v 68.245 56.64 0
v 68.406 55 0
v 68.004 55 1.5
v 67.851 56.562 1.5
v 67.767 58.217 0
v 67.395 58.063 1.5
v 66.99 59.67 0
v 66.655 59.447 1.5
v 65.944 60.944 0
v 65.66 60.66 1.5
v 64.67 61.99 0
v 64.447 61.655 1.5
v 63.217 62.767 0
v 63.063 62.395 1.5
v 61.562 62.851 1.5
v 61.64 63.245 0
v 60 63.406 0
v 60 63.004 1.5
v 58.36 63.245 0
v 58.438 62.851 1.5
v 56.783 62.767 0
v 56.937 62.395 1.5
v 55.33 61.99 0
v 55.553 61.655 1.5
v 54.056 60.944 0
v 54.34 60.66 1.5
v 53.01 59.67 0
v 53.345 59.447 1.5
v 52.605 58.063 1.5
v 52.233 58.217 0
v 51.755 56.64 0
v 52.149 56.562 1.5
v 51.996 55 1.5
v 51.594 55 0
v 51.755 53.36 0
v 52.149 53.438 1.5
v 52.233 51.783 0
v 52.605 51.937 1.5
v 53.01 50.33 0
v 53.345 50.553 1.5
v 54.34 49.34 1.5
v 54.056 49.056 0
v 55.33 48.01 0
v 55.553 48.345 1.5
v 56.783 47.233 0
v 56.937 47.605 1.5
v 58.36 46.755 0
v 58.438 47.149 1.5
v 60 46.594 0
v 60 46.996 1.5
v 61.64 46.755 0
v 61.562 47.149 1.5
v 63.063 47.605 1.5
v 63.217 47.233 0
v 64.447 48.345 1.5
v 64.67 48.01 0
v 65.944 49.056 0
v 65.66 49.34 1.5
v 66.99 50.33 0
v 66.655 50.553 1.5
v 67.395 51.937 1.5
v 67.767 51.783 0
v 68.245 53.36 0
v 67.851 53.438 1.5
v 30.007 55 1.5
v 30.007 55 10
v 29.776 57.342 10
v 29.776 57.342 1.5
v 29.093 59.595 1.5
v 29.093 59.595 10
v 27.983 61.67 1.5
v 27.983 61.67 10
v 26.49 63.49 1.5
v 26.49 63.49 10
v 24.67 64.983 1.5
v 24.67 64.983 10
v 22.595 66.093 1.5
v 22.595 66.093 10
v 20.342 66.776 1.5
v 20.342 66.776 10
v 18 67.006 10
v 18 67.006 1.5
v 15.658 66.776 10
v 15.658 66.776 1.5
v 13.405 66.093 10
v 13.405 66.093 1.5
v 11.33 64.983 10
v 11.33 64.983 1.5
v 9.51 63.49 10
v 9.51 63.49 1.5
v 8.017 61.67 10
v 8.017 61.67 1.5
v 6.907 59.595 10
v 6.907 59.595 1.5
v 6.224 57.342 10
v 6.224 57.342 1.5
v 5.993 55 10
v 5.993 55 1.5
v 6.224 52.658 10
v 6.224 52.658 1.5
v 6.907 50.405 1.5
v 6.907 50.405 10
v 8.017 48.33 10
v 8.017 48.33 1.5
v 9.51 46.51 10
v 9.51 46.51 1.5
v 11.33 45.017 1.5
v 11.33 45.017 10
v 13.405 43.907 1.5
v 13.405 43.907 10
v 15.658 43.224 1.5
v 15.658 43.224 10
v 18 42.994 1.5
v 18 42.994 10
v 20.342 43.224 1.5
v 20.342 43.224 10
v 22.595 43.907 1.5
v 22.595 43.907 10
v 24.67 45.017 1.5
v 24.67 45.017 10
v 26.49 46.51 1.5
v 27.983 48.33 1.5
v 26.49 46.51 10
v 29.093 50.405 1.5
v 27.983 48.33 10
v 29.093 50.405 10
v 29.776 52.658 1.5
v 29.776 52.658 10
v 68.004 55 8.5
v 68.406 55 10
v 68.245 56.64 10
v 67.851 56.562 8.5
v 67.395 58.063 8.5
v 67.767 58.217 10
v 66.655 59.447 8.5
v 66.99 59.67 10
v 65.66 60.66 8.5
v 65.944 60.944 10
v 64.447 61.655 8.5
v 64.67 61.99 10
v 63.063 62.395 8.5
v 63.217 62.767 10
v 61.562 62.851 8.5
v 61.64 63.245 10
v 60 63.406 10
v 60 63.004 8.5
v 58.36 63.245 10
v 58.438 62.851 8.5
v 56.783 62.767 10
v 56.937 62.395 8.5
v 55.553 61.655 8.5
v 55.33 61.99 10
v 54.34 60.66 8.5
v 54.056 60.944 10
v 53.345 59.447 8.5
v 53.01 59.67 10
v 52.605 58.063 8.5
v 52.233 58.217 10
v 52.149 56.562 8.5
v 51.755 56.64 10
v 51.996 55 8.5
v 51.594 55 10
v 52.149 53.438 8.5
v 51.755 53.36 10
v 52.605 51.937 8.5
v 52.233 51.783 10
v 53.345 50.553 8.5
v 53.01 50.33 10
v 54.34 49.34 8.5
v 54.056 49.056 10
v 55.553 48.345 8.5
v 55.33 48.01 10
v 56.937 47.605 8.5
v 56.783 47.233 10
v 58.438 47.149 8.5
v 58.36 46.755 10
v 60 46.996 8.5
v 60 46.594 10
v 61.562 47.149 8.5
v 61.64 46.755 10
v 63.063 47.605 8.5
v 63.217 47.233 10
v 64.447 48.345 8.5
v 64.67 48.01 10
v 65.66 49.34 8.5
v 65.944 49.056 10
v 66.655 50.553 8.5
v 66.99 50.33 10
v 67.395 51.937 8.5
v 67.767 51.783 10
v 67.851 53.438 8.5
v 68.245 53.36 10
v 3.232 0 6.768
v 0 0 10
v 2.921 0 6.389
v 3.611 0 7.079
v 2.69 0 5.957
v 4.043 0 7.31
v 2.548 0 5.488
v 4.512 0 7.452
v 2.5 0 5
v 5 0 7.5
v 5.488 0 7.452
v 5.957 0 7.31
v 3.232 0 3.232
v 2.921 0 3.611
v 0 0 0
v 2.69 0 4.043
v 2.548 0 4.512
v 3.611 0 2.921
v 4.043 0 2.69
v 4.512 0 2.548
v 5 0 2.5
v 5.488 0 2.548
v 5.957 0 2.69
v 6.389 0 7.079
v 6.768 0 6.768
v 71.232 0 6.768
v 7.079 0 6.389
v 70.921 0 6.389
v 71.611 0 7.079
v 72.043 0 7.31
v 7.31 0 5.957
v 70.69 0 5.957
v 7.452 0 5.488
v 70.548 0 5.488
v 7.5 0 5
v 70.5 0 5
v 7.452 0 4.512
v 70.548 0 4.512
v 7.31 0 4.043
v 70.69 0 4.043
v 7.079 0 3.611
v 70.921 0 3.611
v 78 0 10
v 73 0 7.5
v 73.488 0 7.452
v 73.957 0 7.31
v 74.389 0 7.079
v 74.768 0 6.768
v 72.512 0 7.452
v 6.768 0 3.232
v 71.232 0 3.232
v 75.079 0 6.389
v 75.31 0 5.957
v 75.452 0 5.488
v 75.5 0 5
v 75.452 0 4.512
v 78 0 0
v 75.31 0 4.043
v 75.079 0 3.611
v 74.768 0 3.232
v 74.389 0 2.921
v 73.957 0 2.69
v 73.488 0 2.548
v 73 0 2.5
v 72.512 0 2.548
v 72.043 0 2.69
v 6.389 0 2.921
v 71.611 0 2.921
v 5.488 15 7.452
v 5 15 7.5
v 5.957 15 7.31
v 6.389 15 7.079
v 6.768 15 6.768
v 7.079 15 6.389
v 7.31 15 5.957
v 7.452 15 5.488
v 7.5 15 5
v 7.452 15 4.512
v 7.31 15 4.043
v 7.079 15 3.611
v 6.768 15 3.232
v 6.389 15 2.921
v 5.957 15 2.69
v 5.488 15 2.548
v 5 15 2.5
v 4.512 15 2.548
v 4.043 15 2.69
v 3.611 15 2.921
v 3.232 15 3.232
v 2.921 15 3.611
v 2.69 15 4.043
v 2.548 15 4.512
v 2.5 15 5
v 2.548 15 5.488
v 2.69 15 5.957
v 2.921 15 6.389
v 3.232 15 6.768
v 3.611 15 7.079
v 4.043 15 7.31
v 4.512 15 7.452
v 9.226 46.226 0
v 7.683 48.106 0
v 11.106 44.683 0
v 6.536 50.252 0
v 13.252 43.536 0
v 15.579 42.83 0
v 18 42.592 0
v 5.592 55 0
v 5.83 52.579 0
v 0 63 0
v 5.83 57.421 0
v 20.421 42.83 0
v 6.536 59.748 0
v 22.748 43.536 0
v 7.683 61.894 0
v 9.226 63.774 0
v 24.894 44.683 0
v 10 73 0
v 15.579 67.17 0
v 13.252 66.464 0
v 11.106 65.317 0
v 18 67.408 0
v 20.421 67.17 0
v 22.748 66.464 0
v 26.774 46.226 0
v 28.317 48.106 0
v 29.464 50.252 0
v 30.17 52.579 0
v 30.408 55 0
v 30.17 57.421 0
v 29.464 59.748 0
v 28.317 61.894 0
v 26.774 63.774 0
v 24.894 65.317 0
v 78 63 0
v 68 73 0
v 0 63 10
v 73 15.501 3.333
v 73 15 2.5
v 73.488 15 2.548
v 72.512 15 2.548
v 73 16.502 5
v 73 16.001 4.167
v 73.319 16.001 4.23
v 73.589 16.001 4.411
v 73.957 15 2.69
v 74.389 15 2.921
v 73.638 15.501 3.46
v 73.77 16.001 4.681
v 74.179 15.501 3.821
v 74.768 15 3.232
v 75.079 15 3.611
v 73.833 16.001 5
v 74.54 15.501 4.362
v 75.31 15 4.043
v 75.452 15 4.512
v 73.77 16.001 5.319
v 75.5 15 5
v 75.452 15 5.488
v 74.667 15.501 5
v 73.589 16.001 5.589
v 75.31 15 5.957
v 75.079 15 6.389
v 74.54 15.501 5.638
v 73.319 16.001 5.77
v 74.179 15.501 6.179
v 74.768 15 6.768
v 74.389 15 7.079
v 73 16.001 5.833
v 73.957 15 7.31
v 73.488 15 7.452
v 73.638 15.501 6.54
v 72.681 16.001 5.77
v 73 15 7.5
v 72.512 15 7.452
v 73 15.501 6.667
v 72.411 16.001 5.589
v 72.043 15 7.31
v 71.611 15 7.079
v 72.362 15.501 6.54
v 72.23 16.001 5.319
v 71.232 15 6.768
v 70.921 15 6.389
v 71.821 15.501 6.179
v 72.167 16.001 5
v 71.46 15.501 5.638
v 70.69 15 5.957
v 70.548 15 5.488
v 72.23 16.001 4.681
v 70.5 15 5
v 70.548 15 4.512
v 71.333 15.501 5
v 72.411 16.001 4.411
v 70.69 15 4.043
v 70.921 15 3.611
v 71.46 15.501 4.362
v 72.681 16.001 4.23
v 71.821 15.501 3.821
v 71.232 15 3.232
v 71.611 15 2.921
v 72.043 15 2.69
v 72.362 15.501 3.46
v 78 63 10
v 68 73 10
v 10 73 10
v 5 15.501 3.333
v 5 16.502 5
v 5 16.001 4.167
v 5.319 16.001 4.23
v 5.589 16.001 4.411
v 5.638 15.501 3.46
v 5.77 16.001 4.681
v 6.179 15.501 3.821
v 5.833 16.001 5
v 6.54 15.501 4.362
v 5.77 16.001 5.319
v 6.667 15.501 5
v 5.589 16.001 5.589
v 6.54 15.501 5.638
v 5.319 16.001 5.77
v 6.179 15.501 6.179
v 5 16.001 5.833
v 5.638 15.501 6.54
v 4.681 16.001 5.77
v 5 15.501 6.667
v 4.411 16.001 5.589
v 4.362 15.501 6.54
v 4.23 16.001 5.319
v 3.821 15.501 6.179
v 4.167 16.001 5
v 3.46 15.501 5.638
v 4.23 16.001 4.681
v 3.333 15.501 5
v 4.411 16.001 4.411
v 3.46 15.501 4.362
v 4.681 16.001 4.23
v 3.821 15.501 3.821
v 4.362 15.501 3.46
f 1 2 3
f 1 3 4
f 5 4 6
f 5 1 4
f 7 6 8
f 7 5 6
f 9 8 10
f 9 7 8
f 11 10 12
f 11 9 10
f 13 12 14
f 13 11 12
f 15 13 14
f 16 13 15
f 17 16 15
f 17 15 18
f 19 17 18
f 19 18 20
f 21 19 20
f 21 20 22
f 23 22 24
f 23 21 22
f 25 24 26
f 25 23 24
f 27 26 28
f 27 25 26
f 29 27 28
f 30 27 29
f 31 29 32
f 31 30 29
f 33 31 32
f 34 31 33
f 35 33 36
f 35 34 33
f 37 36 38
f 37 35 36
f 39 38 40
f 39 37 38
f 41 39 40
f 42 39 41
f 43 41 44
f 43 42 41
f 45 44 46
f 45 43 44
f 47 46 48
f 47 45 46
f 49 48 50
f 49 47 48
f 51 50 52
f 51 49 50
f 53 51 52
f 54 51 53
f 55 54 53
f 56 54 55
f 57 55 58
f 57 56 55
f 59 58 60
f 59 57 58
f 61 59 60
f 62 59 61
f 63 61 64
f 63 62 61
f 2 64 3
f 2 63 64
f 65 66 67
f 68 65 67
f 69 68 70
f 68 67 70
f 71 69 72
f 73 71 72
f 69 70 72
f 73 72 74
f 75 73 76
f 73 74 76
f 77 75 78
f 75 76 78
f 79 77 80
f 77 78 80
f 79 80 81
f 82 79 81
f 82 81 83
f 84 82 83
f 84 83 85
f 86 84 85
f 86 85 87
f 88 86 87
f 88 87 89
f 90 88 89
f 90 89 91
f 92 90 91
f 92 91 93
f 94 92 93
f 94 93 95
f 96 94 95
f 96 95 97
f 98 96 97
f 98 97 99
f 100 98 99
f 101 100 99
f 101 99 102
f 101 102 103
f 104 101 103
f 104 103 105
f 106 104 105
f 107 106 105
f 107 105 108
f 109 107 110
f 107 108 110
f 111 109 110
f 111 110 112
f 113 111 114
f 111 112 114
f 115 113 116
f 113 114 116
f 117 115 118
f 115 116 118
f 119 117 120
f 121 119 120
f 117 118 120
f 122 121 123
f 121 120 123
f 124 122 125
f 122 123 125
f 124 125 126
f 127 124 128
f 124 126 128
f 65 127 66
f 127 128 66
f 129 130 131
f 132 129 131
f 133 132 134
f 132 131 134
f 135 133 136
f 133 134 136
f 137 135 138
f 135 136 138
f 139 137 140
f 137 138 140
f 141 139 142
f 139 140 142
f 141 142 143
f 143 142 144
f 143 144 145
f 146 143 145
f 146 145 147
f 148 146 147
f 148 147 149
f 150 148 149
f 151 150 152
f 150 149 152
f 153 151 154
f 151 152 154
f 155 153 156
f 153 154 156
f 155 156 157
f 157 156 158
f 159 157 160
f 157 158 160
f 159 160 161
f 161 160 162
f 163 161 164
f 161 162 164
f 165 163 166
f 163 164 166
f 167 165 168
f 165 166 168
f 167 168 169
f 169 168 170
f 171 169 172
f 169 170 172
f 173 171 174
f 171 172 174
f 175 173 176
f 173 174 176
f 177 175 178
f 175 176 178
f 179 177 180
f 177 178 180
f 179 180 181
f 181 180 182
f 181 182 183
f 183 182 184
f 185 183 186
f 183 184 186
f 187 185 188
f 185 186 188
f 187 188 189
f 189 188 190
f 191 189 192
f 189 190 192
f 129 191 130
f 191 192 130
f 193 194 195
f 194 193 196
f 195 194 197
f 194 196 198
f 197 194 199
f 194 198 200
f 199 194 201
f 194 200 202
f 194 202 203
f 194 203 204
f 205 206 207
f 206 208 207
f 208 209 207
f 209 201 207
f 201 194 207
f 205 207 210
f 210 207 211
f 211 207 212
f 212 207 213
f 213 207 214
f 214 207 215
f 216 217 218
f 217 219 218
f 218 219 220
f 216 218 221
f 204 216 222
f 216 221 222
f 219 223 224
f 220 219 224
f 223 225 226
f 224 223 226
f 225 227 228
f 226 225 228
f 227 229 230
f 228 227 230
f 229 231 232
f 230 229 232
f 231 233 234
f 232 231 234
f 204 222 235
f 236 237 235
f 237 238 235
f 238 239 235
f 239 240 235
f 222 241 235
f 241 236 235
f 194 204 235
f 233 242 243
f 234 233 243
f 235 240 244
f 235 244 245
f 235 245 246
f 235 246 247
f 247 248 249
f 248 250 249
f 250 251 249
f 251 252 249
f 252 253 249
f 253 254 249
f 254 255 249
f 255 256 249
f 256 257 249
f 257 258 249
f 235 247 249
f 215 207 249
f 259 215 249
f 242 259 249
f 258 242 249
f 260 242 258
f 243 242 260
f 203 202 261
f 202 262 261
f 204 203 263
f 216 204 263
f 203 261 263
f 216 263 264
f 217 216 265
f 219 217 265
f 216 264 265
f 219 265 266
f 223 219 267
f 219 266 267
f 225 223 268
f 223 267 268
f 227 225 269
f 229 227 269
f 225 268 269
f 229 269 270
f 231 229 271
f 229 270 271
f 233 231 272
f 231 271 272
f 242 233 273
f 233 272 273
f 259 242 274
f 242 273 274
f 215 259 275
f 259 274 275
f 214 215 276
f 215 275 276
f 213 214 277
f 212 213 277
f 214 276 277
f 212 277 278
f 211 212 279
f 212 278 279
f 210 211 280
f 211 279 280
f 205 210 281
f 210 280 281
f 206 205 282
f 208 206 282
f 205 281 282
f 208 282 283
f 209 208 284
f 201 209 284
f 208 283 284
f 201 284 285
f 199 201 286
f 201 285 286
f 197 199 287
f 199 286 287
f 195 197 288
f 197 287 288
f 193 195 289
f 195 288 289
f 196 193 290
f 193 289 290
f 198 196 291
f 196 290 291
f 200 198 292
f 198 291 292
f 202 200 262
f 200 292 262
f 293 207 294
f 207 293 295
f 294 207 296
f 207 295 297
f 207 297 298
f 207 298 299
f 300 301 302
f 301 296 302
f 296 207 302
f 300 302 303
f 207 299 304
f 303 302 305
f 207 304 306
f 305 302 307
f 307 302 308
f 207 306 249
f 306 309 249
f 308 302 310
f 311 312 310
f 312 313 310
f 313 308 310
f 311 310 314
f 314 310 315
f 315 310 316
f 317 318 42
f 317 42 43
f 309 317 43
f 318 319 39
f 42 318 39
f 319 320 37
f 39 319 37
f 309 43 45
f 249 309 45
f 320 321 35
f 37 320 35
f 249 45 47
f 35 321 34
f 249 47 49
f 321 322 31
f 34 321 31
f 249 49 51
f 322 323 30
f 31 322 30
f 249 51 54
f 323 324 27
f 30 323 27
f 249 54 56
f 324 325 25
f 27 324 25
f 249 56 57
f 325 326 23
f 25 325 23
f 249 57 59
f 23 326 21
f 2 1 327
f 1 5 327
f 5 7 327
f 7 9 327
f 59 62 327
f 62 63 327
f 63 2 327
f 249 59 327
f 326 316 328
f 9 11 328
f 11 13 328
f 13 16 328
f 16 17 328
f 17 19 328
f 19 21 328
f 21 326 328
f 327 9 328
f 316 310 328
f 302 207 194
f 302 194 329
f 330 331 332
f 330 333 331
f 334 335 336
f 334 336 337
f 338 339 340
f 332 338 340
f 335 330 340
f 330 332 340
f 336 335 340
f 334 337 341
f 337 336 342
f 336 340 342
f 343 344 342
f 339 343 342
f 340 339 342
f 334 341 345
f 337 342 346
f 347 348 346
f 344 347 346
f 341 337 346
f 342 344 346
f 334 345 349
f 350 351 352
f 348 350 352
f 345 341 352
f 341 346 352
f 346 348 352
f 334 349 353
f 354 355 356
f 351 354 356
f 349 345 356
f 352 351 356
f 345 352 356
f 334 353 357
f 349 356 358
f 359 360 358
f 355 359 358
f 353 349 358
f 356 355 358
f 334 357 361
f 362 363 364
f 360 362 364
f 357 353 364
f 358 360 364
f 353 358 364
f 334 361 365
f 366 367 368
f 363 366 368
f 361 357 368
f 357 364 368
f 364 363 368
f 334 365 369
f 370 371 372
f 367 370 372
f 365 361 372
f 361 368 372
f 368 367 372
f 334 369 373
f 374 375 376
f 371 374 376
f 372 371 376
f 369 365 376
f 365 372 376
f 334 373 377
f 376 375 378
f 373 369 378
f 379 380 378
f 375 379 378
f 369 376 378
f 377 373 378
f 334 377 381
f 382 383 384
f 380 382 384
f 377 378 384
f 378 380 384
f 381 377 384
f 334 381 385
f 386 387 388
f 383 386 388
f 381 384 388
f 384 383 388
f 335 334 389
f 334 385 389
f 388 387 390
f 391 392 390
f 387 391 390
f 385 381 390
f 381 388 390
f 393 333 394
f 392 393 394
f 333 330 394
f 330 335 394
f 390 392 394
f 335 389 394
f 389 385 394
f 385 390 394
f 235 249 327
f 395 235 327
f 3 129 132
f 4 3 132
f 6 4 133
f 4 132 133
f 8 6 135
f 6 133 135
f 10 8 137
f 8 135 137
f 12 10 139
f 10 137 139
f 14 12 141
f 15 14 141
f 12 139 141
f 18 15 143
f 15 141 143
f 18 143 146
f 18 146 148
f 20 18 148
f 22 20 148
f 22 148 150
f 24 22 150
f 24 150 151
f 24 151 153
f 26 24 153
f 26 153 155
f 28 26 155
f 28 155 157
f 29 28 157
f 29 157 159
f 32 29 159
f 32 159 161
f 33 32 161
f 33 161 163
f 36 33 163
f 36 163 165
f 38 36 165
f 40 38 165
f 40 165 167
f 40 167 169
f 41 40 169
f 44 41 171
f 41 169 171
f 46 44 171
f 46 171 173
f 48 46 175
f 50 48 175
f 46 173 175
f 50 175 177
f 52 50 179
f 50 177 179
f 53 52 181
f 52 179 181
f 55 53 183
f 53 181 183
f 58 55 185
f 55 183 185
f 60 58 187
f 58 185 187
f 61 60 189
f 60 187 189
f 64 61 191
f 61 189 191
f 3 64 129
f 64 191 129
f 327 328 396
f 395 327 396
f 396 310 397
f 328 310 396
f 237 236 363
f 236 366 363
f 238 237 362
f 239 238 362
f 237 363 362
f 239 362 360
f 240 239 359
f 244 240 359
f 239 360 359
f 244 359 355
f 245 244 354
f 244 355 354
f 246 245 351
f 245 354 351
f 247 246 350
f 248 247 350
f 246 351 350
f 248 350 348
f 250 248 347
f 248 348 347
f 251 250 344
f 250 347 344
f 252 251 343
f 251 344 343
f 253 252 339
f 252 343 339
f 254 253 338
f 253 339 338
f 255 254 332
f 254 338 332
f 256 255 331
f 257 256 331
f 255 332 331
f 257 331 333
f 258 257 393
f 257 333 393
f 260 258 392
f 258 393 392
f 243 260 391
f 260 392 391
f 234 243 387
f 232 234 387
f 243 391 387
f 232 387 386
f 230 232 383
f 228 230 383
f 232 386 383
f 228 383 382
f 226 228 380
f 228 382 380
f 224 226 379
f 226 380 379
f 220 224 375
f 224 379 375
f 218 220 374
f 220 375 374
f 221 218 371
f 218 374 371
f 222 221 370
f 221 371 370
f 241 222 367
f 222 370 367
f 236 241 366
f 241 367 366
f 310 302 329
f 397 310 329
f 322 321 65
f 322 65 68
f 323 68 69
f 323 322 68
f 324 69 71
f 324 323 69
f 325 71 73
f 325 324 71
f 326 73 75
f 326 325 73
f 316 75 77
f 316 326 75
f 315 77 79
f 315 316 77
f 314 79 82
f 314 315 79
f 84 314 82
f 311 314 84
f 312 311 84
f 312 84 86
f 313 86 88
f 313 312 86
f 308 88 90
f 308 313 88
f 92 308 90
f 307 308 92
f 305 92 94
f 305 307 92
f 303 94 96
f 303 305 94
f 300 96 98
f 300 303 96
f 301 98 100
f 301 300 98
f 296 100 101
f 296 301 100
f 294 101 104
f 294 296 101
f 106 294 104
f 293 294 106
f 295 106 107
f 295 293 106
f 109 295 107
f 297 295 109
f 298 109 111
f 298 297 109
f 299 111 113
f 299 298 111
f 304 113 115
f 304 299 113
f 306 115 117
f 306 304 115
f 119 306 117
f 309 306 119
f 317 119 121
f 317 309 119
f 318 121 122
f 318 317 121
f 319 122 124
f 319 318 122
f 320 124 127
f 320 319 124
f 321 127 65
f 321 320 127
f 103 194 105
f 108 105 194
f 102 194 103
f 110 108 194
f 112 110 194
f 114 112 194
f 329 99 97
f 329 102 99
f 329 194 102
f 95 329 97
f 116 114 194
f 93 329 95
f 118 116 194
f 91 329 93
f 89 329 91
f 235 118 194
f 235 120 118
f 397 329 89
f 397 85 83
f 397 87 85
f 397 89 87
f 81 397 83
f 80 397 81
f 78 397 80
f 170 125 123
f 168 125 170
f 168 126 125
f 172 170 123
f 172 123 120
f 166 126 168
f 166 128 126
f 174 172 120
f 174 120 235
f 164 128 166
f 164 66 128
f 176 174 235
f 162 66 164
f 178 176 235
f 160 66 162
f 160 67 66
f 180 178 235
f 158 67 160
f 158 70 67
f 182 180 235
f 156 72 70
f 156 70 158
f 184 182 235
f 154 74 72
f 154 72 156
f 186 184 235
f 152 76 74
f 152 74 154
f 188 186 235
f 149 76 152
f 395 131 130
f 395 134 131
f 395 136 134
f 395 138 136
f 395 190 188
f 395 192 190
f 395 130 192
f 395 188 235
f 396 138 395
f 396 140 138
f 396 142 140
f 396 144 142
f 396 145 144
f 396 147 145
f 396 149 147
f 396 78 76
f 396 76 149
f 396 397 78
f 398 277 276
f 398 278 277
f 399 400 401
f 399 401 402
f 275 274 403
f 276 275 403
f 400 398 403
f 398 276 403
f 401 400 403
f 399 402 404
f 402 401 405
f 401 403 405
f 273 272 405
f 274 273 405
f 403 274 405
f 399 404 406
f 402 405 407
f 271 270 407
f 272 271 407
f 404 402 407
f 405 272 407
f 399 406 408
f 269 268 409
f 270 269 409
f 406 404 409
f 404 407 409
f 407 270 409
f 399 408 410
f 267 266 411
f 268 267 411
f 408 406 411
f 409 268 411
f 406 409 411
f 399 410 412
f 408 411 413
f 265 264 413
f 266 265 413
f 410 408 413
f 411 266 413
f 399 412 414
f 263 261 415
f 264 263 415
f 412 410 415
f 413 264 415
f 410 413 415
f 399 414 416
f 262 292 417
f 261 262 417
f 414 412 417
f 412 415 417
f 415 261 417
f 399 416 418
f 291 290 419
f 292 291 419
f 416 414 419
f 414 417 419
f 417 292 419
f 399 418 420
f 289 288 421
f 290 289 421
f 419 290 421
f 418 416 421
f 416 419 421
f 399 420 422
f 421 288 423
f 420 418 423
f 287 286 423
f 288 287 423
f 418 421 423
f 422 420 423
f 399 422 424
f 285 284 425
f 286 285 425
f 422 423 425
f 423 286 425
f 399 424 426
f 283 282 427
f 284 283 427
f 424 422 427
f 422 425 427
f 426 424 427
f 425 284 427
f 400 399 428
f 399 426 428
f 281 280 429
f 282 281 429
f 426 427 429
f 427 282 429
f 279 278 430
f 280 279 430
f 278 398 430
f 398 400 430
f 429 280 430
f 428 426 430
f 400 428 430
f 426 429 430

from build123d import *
from OCP.BRepFilletAPI import BRepFilletAPI_MakeChamfer

# Parameters (mm, degrees)
SKETCH1_W             = 78
SKETCH1_H             = 73
EXTRUDE1_DEPTH        = 10
SKETCH3_R             = 12.0065
F_24DIA_HOLE_DEPTH    = 108.29864864
M6_TAPPED_HOLE1_D     = 5
M6_TAPPED_HOLE1_DEPTH = 15
M6_TAPPED_HOLE1_TIP   = 1.502151548
SKETCH7_R             = 8.0045
F_16DIA_HOLE_DEPTH    = 108.29864864
CHAMFER1_SIZE         = 10
CHAMFER2_SIZE         = 1.5
CHAMFER2_SIZE2        = 0.401923789
CHAMFER3_SIZE         = 1.5
CHAMFER3_SIZE2        = 0.401923789


with BuildPart() as part:
    # Sketch1 → Extrude1 (new body)
    with BuildSketch(Plane.XY):
        with Locations((39, 36.5)):
            Rectangle(SKETCH1_W, SKETCH1_H)
    extrude(amount=EXTRUDE1_DEPTH)

    # Sketch3 → 24dia Hole (cut, through all)
    with BuildSketch(Plane.XY.offset(10)):
        with Locations((18, 55)):
            Circle(SKETCH3_R)
    extrude(amount=-F_24DIA_HOLE_DEPTH, mode=Mode.SUBTRACT)

    # M6 Tapped Hole1
    with Locations(Plane(origin=(5, 0, 5), x_dir=(0, 0, -1), z_dir=(0, -1, 0))):
        with Locations((0, 0), (0, 68), (1.921473379, -8.468632325)):
            Hole(M6_TAPPED_HOLE1_D / 2, depth=M6_TAPPED_HOLE1_DEPTH)
            with Locations((0, 0, -(M6_TAPPED_HOLE1_DEPTH + M6_TAPPED_HOLE1_TIP / 2))):  # 118° drill point
                Cone(0, M6_TAPPED_HOLE1_D / 2, M6_TAPPED_HOLE1_TIP, mode=Mode.SUBTRACT)

    # Sketch7 → 16dia hole (cut, through all)
    with BuildSketch(Plane.XY.offset(10)):
        with Locations((60, 55)):
            Circle(SKETCH7_R)
    extrude(amount=-F_16DIA_HOLE_DEPTH, mode=Mode.SUBTRACT)

    # Chamfer1
    chamfer1_edges = [part.edges().sort_by_distance(p)[0] for p in [
        (0, 73, 5),
        (78, 73, 5),
    ]]
    chamfer(chamfer1_edges, length=CHAMFER1_SIZE)

    # Chamfer2: one chamfer whose edges measure the first distance from different faces: ONE call of the kernel's chamfer builder (chamfer() names one face for all edges)
    chamfer2_edges_1 = [part.edges().sort_by_distance(p)[0] for p in [
        (5.9935, 55, 0),
    ]]
    chamfer2_side_1 = [part.faces().sort_by_distance(p)[0] for p in [
        (5.9935, 55, 5),
    ]]
    chamfer2_edges_2 = [part.edges().sort_by_distance(p)[0] for p in [
        (51.9955, 55, 0),
    ]]
    chamfer2_side_2 = [part.faces().sort_by_distance(p)[0] for p in [
        (51.9955, 55, 5),
    ]]
    chamfer2 = BRepFilletAPI_MakeChamfer(part.part.solid().wrapped)
    for e in chamfer2_edges_1:
        chamfer2.Add(CHAMFER2_SIZE, CHAMFER2_SIZE2, e.wrapped, chamfer2_side_1[0].wrapped)  # the first distance lies on this face
    for e in chamfer2_edges_2:
        chamfer2.Add(CHAMFER2_SIZE, CHAMFER2_SIZE2, e.wrapped, chamfer2_side_2[0].wrapped)  # the first distance lies on this face
    add(Compound.cast(chamfer2.Shape()), mode=Mode.REPLACE)

    # Chamfer3
    chamfer3_edges = [part.edges().sort_by_distance(p)[0] for p in [
        (51.9955, 55, 10),
    ]]
    chamfer3_side = [part.faces().sort_by_distance(p)[0] for p in [
        (51.9955, 55, 5.75),
    ]]
    chamfer(chamfer3_edges, length=CHAMFER3_SIZE, length2=CHAMFER3_SIZE2, reference=chamfer3_side[0])


solid = part.part
